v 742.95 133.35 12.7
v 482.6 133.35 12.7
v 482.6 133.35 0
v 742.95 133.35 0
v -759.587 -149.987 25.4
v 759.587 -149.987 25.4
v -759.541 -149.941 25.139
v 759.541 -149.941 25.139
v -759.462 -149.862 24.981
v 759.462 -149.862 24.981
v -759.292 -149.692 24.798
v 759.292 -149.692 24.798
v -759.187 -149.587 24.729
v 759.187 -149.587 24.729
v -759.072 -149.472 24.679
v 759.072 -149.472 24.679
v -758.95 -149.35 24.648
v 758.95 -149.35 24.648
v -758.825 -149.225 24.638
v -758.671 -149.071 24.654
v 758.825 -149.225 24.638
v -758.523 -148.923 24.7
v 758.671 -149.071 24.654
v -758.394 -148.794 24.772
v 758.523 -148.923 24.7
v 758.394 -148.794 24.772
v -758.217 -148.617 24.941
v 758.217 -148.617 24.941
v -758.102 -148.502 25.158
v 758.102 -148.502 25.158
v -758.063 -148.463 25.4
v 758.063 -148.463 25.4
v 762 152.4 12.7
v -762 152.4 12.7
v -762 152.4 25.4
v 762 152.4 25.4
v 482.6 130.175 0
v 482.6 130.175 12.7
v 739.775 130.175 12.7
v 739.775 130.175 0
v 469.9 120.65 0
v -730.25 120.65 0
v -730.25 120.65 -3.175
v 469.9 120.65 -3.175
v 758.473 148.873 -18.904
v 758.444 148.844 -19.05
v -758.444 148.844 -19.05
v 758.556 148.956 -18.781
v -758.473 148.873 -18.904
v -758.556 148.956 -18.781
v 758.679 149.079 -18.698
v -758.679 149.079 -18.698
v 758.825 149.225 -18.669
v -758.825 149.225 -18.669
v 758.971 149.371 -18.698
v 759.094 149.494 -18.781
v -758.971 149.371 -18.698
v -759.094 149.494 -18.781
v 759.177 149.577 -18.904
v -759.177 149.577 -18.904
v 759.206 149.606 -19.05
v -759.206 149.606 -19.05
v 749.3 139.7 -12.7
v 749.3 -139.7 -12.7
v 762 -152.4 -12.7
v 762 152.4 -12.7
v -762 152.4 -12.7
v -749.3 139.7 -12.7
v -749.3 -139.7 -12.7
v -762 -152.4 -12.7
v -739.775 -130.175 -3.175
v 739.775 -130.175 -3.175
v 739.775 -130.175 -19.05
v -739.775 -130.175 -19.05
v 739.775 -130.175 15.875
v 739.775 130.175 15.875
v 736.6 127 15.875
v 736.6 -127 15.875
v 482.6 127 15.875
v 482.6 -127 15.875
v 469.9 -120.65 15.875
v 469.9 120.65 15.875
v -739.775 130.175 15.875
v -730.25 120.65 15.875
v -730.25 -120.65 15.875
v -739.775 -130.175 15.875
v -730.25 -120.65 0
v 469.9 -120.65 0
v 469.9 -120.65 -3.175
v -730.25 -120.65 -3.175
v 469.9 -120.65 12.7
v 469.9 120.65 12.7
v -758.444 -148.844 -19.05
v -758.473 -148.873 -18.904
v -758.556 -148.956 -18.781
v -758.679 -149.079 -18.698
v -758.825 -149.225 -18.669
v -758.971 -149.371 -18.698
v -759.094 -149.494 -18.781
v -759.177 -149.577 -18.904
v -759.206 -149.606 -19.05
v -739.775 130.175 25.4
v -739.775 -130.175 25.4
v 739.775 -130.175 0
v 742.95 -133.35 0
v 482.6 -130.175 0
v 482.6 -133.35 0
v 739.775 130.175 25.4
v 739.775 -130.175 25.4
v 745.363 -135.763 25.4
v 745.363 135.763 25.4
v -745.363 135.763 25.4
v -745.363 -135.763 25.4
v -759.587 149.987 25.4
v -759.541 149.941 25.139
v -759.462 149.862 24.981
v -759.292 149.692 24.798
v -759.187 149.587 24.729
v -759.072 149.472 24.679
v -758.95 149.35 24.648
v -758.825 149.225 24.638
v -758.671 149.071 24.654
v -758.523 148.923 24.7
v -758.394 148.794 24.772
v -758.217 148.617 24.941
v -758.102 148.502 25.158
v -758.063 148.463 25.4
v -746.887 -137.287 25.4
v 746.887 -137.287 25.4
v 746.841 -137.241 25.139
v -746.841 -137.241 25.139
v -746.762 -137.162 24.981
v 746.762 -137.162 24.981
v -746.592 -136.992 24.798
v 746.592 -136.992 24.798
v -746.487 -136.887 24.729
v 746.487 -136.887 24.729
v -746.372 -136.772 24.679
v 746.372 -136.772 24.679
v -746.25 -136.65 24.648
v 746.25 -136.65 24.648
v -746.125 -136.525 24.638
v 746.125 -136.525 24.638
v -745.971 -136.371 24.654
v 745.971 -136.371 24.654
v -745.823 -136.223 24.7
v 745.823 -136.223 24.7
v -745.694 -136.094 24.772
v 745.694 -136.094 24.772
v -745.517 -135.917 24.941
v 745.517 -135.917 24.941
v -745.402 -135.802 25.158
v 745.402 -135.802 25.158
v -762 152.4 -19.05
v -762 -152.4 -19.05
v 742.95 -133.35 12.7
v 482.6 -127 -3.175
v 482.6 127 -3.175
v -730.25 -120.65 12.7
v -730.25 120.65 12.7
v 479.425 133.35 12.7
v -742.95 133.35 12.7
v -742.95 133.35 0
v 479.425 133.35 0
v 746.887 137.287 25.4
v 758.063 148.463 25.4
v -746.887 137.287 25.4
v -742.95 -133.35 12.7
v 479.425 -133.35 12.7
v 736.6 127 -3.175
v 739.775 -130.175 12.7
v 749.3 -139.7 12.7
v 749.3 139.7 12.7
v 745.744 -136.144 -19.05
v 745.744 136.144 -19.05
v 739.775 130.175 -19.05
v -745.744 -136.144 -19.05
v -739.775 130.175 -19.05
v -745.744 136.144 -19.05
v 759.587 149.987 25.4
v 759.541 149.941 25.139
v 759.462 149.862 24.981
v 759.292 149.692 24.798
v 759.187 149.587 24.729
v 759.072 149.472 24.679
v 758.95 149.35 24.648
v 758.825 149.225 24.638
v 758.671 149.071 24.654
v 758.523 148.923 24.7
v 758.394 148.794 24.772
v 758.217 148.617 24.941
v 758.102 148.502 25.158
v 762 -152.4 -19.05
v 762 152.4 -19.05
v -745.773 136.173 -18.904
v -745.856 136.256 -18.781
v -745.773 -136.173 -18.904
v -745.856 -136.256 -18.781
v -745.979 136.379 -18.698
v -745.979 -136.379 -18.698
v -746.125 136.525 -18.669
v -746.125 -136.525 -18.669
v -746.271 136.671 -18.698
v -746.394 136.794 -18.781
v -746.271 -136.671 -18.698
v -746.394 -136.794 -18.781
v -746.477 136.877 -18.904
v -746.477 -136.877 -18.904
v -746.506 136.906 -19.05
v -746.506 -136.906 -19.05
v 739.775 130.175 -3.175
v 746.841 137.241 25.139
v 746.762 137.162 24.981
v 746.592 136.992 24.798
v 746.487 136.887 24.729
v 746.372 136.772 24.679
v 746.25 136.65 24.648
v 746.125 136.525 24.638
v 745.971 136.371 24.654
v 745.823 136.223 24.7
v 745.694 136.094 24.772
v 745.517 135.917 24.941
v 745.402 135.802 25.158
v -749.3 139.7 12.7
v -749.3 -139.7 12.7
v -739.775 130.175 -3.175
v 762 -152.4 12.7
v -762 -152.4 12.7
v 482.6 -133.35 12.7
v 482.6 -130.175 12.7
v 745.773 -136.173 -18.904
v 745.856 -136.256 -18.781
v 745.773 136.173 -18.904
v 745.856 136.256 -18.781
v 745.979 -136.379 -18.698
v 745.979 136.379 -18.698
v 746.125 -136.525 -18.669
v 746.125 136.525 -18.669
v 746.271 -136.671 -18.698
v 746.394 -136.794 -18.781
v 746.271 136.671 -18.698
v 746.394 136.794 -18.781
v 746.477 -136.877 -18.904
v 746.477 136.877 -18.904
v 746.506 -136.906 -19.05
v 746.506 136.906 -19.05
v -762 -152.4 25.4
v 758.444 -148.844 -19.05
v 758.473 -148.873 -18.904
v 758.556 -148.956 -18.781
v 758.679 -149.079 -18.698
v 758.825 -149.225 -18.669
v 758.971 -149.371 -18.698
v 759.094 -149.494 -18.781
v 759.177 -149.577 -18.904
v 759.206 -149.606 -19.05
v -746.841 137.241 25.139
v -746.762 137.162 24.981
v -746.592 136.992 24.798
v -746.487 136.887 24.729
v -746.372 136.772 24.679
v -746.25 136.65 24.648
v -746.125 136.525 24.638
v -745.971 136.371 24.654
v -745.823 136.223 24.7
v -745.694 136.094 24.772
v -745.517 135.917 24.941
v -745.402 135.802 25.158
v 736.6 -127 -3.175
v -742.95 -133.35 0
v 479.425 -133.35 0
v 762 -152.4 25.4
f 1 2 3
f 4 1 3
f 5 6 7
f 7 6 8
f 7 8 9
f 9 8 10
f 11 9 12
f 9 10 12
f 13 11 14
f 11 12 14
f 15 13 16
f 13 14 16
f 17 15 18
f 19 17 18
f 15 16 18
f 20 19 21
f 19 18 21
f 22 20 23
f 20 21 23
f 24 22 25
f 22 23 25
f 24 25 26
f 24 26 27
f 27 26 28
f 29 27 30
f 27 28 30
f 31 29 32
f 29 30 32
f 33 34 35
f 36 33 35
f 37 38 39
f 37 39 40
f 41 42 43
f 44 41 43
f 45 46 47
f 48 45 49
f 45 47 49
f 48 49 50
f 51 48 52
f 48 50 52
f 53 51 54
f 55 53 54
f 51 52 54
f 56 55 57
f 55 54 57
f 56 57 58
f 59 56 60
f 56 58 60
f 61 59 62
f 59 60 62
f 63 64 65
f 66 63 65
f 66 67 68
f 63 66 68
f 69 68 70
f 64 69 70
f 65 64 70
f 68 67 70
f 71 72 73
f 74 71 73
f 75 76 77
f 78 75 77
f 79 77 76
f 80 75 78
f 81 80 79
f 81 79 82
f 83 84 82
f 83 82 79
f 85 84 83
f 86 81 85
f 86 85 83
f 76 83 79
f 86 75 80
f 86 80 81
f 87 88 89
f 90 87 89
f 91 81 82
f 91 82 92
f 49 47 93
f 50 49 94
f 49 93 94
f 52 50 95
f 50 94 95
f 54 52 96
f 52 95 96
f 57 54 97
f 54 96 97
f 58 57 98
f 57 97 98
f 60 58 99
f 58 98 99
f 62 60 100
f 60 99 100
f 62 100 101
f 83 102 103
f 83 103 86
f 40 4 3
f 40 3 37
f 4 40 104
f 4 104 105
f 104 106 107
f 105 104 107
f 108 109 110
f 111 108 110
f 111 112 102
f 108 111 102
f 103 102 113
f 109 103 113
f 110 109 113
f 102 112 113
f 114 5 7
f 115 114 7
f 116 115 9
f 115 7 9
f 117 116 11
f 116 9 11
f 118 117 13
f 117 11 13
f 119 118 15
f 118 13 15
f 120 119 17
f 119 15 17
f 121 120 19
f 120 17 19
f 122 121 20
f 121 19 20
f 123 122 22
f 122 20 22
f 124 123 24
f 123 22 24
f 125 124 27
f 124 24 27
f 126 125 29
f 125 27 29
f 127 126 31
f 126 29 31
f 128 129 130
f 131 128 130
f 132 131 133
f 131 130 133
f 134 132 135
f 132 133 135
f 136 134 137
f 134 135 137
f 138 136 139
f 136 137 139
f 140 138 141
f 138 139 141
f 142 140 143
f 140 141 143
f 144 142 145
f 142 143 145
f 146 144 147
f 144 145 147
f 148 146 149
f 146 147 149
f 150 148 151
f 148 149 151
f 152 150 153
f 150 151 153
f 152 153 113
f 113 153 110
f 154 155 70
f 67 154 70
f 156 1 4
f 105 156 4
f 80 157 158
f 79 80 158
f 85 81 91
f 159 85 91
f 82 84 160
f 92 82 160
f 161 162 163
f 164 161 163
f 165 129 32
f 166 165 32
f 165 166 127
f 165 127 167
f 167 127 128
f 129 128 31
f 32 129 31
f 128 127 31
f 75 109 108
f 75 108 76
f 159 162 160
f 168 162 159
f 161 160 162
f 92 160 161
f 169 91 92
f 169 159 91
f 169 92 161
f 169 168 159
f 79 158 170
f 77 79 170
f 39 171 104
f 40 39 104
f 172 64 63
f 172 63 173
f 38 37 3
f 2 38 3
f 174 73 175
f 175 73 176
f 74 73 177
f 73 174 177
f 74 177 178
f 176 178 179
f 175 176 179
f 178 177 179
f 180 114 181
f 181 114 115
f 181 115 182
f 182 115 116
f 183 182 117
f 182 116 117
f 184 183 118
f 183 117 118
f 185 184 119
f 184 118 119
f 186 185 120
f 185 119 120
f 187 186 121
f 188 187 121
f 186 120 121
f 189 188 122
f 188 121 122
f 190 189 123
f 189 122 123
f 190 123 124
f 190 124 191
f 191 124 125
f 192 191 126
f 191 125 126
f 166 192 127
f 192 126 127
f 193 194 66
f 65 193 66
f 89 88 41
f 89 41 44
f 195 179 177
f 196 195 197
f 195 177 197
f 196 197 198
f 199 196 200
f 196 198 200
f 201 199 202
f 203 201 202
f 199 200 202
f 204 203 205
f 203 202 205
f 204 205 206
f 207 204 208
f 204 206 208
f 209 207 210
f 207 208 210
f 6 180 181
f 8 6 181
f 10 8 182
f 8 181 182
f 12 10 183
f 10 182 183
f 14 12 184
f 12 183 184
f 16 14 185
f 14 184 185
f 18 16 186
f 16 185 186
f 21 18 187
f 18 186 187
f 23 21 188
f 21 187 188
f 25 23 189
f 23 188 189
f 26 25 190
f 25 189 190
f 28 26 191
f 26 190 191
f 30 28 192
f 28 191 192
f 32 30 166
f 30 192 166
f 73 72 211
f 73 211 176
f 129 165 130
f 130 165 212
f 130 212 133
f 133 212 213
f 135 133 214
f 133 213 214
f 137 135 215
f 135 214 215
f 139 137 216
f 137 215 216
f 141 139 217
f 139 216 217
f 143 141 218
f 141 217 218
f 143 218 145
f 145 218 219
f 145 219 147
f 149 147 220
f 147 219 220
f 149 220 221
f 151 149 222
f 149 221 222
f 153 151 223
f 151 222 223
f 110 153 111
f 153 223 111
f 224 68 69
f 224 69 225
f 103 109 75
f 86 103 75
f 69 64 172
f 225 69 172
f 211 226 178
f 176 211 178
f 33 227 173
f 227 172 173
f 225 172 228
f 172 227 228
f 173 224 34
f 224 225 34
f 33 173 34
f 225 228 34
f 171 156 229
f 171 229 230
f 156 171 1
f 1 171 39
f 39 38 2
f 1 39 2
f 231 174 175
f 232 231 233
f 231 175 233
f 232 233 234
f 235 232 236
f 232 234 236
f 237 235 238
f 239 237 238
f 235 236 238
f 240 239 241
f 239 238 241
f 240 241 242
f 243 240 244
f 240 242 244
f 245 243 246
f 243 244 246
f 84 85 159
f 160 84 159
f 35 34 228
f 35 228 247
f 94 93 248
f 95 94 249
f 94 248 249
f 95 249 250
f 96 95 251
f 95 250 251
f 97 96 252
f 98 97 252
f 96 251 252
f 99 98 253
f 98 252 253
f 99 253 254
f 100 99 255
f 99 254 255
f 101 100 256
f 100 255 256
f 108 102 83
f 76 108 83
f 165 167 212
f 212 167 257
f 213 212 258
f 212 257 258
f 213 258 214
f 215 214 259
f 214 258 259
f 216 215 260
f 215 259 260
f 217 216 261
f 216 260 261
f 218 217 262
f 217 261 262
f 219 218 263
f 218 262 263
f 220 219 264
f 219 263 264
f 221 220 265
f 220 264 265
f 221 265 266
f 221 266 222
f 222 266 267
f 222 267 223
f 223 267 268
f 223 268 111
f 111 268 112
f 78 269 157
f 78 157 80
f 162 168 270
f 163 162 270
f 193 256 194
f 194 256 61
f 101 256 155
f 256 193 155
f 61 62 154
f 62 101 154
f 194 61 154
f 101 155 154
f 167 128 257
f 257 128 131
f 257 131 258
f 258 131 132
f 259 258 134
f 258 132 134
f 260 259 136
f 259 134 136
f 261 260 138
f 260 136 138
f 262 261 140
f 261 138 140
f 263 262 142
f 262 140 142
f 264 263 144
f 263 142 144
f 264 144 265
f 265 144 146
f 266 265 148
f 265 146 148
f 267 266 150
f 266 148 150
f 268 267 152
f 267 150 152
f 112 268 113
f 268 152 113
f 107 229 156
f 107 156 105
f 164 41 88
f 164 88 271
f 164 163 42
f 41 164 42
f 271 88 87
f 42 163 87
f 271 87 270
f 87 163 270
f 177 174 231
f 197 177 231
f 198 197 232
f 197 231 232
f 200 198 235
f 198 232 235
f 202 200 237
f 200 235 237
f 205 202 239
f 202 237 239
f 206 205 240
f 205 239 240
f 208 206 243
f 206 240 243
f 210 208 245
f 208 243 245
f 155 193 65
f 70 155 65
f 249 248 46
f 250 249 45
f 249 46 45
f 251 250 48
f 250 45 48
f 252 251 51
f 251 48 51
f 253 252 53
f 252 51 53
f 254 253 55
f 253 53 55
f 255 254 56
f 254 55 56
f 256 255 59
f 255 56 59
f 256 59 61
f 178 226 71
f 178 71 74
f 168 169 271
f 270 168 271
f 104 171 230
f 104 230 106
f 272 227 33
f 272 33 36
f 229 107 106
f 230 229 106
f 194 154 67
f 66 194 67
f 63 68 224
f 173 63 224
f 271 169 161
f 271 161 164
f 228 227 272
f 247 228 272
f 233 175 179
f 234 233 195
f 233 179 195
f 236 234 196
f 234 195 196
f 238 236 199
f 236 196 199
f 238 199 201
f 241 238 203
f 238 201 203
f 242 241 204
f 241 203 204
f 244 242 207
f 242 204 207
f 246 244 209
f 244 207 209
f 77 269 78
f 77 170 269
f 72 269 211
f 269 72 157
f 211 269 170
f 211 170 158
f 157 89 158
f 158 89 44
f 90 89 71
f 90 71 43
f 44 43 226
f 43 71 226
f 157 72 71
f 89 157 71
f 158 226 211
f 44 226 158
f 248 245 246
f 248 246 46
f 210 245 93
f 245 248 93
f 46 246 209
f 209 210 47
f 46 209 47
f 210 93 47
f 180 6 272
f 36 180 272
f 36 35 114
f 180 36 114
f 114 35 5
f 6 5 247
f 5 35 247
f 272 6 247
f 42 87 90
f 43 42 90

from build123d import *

# Parameters (mm, degrees)
CUT_EXTRUDE1_START  = -19.05
SKETCH3_W           = 254
SKETCH3_H           = 254
CUT_EXTRUDE1_DEPTH  = 19.05
BOSS_EXTRUDE1_DEPTH = 266.7
SKETCH7_W           = 12.7
SKETCH7_H           = 3.175


with BuildPart() as part:
    # Sweep1: sweep along a path in Sketch2
    with BuildLine(Plane.XY) as sweep1_path:
        Line((762, 152.4), (-762, 152.4))
        Line((-762, 152.4), (-762, -152.4))
        Line((-762, -152.4), (762, -152.4))
        Line((762, -152.4), (762, 152.4))
    # Sketch1 → Sweep1 (sweep)
    with BuildSketch(Plane(origin=(0, 0, 0), x_dir=(1, 0, 0), z_dir=(0, 1, 0))):
        with BuildLine():
            Line((-762, -25.4), (-759.587, -25.4))
            ThreePointArc((-759.587, -25.4), (-758.825, -24.638), (-758.063, -25.4))
            Line((-758.063, -25.4), (-746.887, -25.4))
            ThreePointArc((-746.887, -25.4), (-746.125, -24.638), (-745.363, -25.4))
            Line((-745.363, -25.4), (-739.775, -25.4))
            Line((-739.775, -25.4), (-739.775, -15.875))
            Line((-739.775, -15.875), (-730.25, -15.875))
            Line((-730.25, -15.875), (-730.25, -12.7))
            Line((-730.25, -12.7), (-742.95, -12.7))
            Line((-742.95, -12.7), (-742.95, 0))
            Line((-742.95, 0), (-730.25, 0))
            Line((-730.25, 0), (-730.25, 3.175))
            Line((-730.25, 3.175), (-739.775, 3.175))
            Line((-739.775, 3.175), (-739.775, 19.05))
            Line((-739.775, 19.05), (-745.744, 19.05))
            ThreePointArc((-745.744, 19.05), (-746.125, 18.669), (-746.506, 19.05))
            Line((-746.506, 19.05), (-758.444, 19.05))
            ThreePointArc((-758.444, 19.05), (-758.825, 18.669), (-759.206, 19.05))
            Line((-759.206, 19.05), (-762, 19.05))
            Line((-762, 19.05), (-762, 12.7))
            Line((-762, 12.7), (-749.3, 12.7))
            Line((-749.3, 12.7), (-749.3, -12.7))
            Line((-749.3, -12.7), (-762, -12.7))
            Line((-762, -12.7), (-762, -25.4))
        make_face()
    sweep(path=sweep1_path.line, transition=Transition.RIGHT)

    # Sketch3 → Cut-Extrude1 (cut)
    with BuildSketch(Plane.XY.offset(15.875).offset(CUT_EXTRUDE1_START)):
        with Locations((609.6, 0)):
            Rectangle(SKETCH3_W, SKETCH3_H)
    extrude(amount=CUT_EXTRUDE1_DEPTH, mode=Mode.SUBTRACT)

    # Sketch6 → Boss-Extrude1 (add)
    with BuildSketch(Plane(origin=(0, -133.35, 0), x_dir=(1, 0, 0), z_dir=(0, 1, 0))):
        Polygon((482.6, 3.175), (482.6, -15.875), (469.9, -15.875), (469.9, -12.7), (479.425, -12.7), (479.425, 0), (469.9, 0), (469.9, 3.175), align=None)
    extrude(amount=BOSS_EXTRUDE1_DEPTH)

    # Sweep2: sweep along a path in Sketch8
    with BuildLine(Plane(origin=(0, 0, -3.175), x_dir=(-1, 0, 0), z_dir=(0, 0, -1))) as sweep2_path:
        Line((-482.6, -127), (-736.6, -127))
        Line((-736.6, -127), (-736.6, 127))
        Line((-736.6, 127), (-482.6, 127))
    # Sketch7 → Sweep2 (sweep)
    with BuildSketch(Plane(origin=(482.6, 0, 0), x_dir=(0, 0, -1), z_dir=(1, 0, 0))):
        with Locations((-6.35, -128.5875)):
            Rectangle(SKETCH7_W, SKETCH7_H)
    sweep(path=sweep2_path.line, transition=Transition.RIGHT)


solid = part.part
